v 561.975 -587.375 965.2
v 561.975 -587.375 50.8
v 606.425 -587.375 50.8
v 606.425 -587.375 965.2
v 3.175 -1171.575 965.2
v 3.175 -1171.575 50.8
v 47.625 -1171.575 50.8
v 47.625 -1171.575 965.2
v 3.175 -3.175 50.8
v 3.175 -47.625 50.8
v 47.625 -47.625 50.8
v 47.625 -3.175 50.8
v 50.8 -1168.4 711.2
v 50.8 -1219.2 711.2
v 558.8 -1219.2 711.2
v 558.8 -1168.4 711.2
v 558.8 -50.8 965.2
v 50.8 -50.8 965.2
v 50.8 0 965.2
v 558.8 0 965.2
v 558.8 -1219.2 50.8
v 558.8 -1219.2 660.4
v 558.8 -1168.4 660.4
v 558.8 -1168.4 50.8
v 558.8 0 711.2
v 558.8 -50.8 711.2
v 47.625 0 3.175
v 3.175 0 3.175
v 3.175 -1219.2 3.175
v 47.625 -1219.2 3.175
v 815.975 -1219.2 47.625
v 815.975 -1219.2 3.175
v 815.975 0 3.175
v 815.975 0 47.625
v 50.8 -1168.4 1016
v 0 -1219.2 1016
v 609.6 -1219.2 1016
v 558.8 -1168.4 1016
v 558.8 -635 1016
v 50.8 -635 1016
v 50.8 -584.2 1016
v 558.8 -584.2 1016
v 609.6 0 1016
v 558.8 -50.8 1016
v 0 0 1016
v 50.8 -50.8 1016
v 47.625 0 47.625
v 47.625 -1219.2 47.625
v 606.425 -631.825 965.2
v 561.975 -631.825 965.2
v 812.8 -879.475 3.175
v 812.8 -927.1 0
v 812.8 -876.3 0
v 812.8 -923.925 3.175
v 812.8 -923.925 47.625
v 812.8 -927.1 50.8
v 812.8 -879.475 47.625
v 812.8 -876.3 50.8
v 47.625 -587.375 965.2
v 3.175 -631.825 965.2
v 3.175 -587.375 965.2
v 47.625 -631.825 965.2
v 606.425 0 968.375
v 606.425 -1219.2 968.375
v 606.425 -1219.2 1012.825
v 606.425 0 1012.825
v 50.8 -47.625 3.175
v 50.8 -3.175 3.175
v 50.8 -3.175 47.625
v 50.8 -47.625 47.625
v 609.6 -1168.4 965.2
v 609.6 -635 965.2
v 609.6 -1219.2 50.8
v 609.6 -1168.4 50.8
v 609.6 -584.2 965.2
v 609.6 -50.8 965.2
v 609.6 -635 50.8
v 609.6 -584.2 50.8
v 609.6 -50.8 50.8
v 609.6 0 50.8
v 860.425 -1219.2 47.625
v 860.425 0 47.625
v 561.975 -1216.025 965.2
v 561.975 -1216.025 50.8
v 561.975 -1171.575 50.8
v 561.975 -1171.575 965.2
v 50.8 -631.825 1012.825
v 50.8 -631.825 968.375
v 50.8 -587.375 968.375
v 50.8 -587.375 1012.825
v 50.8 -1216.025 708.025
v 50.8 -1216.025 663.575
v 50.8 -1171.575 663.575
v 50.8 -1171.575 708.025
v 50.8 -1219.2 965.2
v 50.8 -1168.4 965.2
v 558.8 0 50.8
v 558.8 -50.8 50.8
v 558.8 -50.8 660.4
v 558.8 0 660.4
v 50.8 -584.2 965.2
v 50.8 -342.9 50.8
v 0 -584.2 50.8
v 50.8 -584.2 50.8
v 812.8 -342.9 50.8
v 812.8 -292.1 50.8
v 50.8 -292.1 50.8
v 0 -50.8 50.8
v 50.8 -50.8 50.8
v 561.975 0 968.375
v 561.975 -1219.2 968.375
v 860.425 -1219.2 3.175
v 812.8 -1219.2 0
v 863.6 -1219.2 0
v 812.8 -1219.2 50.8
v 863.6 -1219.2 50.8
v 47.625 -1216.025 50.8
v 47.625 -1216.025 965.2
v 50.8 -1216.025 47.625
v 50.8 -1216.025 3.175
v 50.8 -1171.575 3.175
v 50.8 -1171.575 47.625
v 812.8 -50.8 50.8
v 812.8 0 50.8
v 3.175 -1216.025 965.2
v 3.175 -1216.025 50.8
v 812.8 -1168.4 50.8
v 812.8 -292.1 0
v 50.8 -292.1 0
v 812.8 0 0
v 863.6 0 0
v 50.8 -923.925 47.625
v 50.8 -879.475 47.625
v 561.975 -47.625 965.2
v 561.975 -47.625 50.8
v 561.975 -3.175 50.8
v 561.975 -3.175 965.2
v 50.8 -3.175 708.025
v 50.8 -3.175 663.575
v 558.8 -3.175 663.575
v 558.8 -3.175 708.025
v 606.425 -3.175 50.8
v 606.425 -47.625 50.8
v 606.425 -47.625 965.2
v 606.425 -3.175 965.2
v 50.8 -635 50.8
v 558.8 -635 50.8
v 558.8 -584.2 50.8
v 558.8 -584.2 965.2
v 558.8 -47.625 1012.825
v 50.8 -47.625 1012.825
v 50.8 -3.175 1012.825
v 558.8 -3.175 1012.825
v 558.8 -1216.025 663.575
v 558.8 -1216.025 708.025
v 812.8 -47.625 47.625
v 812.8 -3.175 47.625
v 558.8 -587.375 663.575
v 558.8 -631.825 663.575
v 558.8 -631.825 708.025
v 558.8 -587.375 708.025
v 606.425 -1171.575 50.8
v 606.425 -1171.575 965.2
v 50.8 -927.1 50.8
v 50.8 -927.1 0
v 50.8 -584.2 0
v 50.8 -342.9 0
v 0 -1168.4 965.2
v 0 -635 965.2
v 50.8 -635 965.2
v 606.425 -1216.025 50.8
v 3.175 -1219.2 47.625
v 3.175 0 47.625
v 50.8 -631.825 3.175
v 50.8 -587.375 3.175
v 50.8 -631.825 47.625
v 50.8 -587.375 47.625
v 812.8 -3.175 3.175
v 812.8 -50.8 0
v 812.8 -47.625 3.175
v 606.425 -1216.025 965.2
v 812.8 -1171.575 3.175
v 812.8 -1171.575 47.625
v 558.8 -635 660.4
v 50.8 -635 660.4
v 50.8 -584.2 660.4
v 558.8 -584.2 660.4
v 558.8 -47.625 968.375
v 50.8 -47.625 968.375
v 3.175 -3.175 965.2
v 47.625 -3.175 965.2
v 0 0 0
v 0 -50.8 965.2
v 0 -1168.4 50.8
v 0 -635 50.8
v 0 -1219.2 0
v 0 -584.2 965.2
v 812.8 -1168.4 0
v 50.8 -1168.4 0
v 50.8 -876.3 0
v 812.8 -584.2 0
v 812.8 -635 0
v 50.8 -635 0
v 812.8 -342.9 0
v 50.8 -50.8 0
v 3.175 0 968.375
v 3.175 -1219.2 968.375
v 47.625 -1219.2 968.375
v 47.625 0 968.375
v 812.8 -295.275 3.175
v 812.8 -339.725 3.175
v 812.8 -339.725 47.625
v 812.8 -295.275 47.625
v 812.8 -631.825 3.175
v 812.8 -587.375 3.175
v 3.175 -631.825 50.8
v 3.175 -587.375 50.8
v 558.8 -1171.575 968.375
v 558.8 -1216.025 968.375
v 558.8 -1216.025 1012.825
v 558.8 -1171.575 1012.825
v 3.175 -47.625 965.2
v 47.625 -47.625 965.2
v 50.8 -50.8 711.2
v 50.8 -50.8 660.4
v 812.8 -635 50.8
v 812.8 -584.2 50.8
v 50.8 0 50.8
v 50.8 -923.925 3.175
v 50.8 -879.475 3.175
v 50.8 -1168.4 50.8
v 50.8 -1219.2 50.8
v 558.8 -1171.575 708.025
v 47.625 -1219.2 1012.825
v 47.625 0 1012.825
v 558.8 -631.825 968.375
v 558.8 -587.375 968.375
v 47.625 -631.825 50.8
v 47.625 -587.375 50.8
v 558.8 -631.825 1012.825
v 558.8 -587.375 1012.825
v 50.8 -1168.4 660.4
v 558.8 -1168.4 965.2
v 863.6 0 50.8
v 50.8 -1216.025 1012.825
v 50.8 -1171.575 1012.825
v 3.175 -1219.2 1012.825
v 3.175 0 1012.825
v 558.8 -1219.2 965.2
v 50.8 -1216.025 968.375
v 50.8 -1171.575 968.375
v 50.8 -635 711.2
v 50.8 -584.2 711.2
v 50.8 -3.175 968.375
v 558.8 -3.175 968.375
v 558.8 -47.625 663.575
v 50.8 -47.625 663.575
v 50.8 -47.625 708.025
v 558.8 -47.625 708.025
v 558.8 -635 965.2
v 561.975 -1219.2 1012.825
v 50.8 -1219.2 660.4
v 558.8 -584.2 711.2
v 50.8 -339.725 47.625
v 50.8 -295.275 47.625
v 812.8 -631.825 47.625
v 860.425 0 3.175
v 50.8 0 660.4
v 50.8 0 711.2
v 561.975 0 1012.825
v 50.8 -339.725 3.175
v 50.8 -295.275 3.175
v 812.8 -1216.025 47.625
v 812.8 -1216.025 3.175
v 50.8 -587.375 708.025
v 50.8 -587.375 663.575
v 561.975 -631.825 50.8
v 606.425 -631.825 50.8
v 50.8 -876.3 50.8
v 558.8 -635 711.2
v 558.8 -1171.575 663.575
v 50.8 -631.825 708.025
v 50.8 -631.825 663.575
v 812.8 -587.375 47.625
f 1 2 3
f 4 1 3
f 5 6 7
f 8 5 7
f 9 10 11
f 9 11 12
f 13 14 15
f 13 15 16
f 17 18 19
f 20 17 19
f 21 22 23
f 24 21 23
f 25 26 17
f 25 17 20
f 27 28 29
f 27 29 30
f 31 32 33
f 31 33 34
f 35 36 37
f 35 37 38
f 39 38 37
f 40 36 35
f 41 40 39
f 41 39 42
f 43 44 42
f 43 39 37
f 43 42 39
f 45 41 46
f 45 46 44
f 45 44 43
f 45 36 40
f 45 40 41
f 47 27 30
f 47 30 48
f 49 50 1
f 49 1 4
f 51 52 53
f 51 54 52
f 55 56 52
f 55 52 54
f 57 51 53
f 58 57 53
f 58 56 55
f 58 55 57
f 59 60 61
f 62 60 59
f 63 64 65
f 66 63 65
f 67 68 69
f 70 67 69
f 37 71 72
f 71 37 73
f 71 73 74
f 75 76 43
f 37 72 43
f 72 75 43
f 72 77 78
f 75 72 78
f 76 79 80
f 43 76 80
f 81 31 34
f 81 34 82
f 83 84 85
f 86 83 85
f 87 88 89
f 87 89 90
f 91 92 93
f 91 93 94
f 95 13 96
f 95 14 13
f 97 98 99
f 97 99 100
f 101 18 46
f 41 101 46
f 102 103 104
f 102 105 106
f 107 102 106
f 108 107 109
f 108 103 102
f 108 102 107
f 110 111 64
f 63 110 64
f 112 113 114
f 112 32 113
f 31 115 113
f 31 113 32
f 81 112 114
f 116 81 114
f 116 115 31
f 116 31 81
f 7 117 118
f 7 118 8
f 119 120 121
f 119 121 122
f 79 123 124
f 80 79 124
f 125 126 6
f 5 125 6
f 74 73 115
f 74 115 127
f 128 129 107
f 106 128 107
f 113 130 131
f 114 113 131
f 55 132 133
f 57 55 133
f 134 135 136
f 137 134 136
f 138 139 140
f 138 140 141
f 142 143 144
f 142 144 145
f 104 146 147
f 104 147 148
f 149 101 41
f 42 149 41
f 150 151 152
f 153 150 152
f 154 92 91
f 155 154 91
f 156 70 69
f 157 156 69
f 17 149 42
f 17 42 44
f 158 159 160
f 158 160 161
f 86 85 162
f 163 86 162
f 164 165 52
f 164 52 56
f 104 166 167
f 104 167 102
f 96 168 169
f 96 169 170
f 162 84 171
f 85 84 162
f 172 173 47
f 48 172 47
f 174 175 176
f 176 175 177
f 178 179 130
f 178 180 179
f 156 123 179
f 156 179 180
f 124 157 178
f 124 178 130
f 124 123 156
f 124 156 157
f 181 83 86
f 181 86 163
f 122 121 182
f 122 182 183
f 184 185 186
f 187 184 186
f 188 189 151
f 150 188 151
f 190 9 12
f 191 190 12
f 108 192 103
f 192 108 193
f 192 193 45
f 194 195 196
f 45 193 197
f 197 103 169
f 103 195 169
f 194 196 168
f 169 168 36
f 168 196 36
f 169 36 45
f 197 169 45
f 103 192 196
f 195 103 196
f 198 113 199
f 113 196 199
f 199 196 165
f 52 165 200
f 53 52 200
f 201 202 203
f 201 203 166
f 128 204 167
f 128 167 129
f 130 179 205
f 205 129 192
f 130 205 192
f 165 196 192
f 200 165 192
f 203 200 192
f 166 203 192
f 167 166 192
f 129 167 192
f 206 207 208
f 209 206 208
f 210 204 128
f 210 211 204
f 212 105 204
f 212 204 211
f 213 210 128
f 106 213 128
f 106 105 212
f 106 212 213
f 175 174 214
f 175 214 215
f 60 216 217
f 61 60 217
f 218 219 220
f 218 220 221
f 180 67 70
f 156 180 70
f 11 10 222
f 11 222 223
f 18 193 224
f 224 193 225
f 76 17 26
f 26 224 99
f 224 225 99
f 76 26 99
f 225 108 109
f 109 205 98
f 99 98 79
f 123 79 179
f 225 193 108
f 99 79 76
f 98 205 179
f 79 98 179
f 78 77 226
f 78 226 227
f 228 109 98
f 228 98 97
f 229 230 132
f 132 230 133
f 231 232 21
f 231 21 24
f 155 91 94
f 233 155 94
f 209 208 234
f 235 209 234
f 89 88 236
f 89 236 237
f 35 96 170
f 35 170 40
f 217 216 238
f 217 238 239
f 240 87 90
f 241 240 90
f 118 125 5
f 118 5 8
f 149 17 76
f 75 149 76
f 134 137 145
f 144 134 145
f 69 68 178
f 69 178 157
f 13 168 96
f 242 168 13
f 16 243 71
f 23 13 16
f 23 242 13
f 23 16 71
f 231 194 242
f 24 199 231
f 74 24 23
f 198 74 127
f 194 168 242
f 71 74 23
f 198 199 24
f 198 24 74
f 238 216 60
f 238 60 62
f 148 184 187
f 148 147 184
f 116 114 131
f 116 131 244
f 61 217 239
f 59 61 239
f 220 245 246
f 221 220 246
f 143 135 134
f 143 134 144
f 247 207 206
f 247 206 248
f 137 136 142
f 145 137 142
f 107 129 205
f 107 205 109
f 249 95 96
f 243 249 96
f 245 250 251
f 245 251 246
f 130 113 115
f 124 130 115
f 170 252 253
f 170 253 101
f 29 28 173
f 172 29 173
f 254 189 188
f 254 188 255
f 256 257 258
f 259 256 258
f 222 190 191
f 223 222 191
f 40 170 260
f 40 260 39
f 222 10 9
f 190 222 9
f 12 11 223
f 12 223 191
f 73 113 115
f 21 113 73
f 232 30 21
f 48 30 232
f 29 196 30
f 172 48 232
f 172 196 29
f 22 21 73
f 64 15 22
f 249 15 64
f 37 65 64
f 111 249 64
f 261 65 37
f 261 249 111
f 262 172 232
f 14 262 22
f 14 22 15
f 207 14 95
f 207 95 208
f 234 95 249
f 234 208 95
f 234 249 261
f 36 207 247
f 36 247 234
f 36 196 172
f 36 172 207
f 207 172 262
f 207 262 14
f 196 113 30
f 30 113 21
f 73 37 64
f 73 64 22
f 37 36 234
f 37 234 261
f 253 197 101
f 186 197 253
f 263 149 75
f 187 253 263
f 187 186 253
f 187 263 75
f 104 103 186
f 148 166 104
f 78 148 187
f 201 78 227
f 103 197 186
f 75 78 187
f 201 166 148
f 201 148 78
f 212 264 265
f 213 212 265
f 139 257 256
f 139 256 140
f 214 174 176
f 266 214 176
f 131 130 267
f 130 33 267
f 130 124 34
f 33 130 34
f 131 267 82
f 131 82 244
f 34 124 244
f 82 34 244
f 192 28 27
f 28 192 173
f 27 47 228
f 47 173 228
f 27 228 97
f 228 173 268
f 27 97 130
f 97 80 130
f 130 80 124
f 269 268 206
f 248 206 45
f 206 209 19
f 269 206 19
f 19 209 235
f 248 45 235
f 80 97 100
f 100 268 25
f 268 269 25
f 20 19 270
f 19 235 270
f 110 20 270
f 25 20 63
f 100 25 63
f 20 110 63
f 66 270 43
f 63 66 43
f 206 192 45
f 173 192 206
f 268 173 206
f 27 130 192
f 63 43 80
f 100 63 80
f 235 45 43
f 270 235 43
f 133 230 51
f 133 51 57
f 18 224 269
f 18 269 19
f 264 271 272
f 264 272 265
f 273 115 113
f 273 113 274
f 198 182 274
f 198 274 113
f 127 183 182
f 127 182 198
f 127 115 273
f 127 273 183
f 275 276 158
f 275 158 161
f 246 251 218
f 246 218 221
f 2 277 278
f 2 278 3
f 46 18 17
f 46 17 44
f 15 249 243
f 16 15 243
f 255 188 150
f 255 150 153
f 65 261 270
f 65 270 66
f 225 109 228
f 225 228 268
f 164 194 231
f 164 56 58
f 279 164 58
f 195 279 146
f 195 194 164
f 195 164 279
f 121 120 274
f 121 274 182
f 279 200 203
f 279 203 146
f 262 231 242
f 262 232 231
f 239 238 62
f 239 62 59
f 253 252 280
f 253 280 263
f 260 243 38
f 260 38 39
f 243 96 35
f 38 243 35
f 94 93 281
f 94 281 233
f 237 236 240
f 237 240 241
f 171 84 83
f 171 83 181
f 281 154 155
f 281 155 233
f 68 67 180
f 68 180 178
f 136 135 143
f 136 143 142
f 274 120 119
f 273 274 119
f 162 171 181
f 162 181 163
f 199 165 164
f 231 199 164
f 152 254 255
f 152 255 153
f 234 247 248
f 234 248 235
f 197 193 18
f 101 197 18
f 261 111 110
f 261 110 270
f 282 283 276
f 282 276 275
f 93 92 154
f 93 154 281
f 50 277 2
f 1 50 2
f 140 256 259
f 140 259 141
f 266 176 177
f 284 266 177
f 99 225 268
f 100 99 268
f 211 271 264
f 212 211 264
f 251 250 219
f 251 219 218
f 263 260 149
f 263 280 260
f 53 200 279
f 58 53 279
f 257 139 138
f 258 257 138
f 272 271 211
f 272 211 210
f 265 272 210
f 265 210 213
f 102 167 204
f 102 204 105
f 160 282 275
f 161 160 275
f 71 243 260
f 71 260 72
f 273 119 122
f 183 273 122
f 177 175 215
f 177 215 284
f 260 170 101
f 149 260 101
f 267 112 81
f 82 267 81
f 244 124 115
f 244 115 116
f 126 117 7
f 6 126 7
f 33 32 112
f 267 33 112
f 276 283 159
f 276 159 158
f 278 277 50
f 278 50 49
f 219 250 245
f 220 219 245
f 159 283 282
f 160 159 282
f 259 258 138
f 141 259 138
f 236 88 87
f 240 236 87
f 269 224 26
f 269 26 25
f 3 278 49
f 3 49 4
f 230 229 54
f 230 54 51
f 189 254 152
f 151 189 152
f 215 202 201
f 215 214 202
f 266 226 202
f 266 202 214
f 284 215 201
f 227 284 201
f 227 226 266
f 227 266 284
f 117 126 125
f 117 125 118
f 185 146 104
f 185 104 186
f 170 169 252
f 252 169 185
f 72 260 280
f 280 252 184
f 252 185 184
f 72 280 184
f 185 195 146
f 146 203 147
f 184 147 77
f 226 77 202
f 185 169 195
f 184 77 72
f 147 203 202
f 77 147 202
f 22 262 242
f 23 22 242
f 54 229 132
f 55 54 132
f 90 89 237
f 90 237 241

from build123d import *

# Parameters (mm, degrees)
F0_W      = 50.8
F0_H      = 50.8
F0_W_2    = 44.45
F0_H_2    = 44.45
F1_DEPTH  = 1219.2
F2_W      = 50.8
F2_H      = 50.8
F2_W_2    = 44.45
F2_H_2    = 44.45
F3_DEPTH  = 762
F4_W      = 50.8
F4_H      = 50.8
F4_W_2    = 44.45
F4_H_2    = 44.45
F5_DEPTH  = 1219.2
F6_W      = 50.8
F6_H      = 50.8
F6_W_2    = 44.45
F6_H_2    = 44.45
F7_DEPTH  = 914.4
F8_W      = 50.8
F8_H      = 50.8
F8_W_2    = 44.45
F8_H_2    = 44.45
F9_DEPTH  = 1219.2
F10_W     = 50.8
F10_H     = 50.8
F10_W_2   = 44.45
F10_H_2   = 44.45
F11_DEPTH = 508


with BuildPart() as f1:
    # F0 (on Front) → F1 (new body)
    with BuildSketch(Plane.XZ):
        with Locations((25.4, 25.4)):
            Rectangle(F0_W, F0_H)
        with Locations((25.4, 25.4)):
            Rectangle(F0_W_2, F0_H_2, mode=Mode.SUBTRACT)
    extrude(amount=F1_DEPTH)

    # F2 (on face) → F3 (join)
    with BuildSketch(Plane.YZ.offset(50.8)):
        with Locations((-1193.8, 25.4)):
            Rectangle(F2_W, F2_H)
        with Locations((-1193.8, 25.4)):
            Rectangle(F2_W_2, F2_H_2, mode=Mode.SUBTRACT)
        with Locations((-901.7, 25.4)):
            Rectangle(F2_W, F2_H)
        with Locations((-901.7, 25.4)):
            Rectangle(F2_W_2, F2_H_2, mode=Mode.SUBTRACT)
        with Locations((-609.6, 25.4)):
            Rectangle(F2_W, F2_H)
        with Locations((-609.6, 25.4)):
            Rectangle(F2_W_2, F2_H_2, mode=Mode.SUBTRACT)
        with Locations((-317.5, 25.4)):
            Rectangle(F2_W, F2_H)
        with Locations((-317.5, 25.4)):
            Rectangle(F2_W_2, F2_H_2, mode=Mode.SUBTRACT)
        with Locations((-25.4, 25.4)):
            Rectangle(F2_W, F2_H)
        with Locations((-25.4, 25.4)):
            Rectangle(F2_W_2, F2_H_2, mode=Mode.SUBTRACT)
    extrude(amount=F3_DEPTH)

    # F6 (on face) → F7 (join)
    with BuildSketch(Plane.XY.offset(50.8)):
        with Locations((25.4, -1193.8)):
            Rectangle(F6_W, F6_H)
        with Locations((25.4, -1193.8)):
            Rectangle(F6_W_2, F6_H_2, mode=Mode.SUBTRACT)
        with Locations((25.4, -25.4)):
            Rectangle(F6_W, F6_H)
        with Locations((25.4, -25.4)):
            Rectangle(F6_W_2, F6_H_2, mode=Mode.SUBTRACT)
        with Locations((25.4, -609.6)):
            Rectangle(F6_W, F6_H)
        with Locations((25.4, -609.6)):
            Rectangle(F6_W_2, F6_H_2, mode=Mode.SUBTRACT)
        with Locations((584.2, -1193.8)):
            Rectangle(F6_W, F6_H)
        with Locations((584.2, -1193.8)):
            Rectangle(F6_W_2, F6_H_2, mode=Mode.SUBTRACT)
        with Locations((584.2, -25.4)):
            Rectangle(F6_W, F6_H)
        with Locations((584.2, -25.4)):
            Rectangle(F6_W_2, F6_H_2, mode=Mode.SUBTRACT)
        with Locations((584.2, -609.6)):
            Rectangle(F6_W, F6_H)
        with Locations((584.2, -609.6)):
            Rectangle(F6_W_2, F6_H_2, mode=Mode.SUBTRACT)
    extrude(amount=F7_DEPTH)

    # F8 (on face) → F9 (join)
    with BuildSketch(Plane.XZ.offset(1219.2)):
        with Locations((25.4, 990.6)):
            Rectangle(F8_W, F8_H)
        with Locations((25.4, 990.6)):
            Rectangle(F8_W_2, F8_H_2, mode=Mode.SUBTRACT)
        with Locations((584.2, 990.6)):
            Rectangle(F8_W, F8_H)
        with Locations((584.2, 990.6)):
            Rectangle(F8_W_2, F8_H_2, mode=Mode.SUBTRACT)
    extrude(amount=-F9_DEPTH)

    # F10 (on face) → F11 (join)
    with BuildSketch(Plane.YZ.offset(50.8)):
        with Locations((-1193.8, 685.8)):
            Rectangle(F10_W, F10_H)
        with Locations((-1193.8, 685.8)):
            Rectangle(F10_W_2, F10_H_2, mode=Mode.SUBTRACT)
        with Locations((-1193.8, 990.6)):
            Rectangle(F10_W, F10_H)
        with Locations((-1193.8, 990.6)):
            Rectangle(F10_W_2, F10_H_2, mode=Mode.SUBTRACT)
        with Locations((-609.6, 685.8)):
            Rectangle(F10_W, F10_H)
        with Locations((-609.6, 685.8)):
            Rectangle(F10_W_2, F10_H_2, mode=Mode.SUBTRACT)
        with Locations((-609.6, 990.6)):
            Rectangle(F10_W, F10_H)
        with Locations((-609.6, 990.6)):
            Rectangle(F10_W_2, F10_H_2, mode=Mode.SUBTRACT)
        with Locations((-25.4, 685.8)):
            Rectangle(F10_W, F10_H)
        with Locations((-25.4, 685.8)):
            Rectangle(F10_W_2, F10_H_2, mode=Mode.SUBTRACT)
        with Locations((-25.4, 990.6)):
            Rectangle(F10_W, F10_H)
        with Locations((-25.4, 990.6)):
            Rectangle(F10_W_2, F10_H_2, mode=Mode.SUBTRACT)
    extrude(amount=F11_DEPTH)


with BuildPart() as f5:
    # F4 (on face) → F5 (new body)
    with BuildSketch(Plane.XZ.offset(1219.2)):
        with Locations((838.2, 25.4)):
            Rectangle(F4_W, F4_H)
        with Locations((838.2, 25.4)):
            Rectangle(F4_W_2, F4_H_2, mode=Mode.SUBTRACT)
    extrude(amount=-F5_DEPTH)


solid = Compound([f1.part, f5.part])
